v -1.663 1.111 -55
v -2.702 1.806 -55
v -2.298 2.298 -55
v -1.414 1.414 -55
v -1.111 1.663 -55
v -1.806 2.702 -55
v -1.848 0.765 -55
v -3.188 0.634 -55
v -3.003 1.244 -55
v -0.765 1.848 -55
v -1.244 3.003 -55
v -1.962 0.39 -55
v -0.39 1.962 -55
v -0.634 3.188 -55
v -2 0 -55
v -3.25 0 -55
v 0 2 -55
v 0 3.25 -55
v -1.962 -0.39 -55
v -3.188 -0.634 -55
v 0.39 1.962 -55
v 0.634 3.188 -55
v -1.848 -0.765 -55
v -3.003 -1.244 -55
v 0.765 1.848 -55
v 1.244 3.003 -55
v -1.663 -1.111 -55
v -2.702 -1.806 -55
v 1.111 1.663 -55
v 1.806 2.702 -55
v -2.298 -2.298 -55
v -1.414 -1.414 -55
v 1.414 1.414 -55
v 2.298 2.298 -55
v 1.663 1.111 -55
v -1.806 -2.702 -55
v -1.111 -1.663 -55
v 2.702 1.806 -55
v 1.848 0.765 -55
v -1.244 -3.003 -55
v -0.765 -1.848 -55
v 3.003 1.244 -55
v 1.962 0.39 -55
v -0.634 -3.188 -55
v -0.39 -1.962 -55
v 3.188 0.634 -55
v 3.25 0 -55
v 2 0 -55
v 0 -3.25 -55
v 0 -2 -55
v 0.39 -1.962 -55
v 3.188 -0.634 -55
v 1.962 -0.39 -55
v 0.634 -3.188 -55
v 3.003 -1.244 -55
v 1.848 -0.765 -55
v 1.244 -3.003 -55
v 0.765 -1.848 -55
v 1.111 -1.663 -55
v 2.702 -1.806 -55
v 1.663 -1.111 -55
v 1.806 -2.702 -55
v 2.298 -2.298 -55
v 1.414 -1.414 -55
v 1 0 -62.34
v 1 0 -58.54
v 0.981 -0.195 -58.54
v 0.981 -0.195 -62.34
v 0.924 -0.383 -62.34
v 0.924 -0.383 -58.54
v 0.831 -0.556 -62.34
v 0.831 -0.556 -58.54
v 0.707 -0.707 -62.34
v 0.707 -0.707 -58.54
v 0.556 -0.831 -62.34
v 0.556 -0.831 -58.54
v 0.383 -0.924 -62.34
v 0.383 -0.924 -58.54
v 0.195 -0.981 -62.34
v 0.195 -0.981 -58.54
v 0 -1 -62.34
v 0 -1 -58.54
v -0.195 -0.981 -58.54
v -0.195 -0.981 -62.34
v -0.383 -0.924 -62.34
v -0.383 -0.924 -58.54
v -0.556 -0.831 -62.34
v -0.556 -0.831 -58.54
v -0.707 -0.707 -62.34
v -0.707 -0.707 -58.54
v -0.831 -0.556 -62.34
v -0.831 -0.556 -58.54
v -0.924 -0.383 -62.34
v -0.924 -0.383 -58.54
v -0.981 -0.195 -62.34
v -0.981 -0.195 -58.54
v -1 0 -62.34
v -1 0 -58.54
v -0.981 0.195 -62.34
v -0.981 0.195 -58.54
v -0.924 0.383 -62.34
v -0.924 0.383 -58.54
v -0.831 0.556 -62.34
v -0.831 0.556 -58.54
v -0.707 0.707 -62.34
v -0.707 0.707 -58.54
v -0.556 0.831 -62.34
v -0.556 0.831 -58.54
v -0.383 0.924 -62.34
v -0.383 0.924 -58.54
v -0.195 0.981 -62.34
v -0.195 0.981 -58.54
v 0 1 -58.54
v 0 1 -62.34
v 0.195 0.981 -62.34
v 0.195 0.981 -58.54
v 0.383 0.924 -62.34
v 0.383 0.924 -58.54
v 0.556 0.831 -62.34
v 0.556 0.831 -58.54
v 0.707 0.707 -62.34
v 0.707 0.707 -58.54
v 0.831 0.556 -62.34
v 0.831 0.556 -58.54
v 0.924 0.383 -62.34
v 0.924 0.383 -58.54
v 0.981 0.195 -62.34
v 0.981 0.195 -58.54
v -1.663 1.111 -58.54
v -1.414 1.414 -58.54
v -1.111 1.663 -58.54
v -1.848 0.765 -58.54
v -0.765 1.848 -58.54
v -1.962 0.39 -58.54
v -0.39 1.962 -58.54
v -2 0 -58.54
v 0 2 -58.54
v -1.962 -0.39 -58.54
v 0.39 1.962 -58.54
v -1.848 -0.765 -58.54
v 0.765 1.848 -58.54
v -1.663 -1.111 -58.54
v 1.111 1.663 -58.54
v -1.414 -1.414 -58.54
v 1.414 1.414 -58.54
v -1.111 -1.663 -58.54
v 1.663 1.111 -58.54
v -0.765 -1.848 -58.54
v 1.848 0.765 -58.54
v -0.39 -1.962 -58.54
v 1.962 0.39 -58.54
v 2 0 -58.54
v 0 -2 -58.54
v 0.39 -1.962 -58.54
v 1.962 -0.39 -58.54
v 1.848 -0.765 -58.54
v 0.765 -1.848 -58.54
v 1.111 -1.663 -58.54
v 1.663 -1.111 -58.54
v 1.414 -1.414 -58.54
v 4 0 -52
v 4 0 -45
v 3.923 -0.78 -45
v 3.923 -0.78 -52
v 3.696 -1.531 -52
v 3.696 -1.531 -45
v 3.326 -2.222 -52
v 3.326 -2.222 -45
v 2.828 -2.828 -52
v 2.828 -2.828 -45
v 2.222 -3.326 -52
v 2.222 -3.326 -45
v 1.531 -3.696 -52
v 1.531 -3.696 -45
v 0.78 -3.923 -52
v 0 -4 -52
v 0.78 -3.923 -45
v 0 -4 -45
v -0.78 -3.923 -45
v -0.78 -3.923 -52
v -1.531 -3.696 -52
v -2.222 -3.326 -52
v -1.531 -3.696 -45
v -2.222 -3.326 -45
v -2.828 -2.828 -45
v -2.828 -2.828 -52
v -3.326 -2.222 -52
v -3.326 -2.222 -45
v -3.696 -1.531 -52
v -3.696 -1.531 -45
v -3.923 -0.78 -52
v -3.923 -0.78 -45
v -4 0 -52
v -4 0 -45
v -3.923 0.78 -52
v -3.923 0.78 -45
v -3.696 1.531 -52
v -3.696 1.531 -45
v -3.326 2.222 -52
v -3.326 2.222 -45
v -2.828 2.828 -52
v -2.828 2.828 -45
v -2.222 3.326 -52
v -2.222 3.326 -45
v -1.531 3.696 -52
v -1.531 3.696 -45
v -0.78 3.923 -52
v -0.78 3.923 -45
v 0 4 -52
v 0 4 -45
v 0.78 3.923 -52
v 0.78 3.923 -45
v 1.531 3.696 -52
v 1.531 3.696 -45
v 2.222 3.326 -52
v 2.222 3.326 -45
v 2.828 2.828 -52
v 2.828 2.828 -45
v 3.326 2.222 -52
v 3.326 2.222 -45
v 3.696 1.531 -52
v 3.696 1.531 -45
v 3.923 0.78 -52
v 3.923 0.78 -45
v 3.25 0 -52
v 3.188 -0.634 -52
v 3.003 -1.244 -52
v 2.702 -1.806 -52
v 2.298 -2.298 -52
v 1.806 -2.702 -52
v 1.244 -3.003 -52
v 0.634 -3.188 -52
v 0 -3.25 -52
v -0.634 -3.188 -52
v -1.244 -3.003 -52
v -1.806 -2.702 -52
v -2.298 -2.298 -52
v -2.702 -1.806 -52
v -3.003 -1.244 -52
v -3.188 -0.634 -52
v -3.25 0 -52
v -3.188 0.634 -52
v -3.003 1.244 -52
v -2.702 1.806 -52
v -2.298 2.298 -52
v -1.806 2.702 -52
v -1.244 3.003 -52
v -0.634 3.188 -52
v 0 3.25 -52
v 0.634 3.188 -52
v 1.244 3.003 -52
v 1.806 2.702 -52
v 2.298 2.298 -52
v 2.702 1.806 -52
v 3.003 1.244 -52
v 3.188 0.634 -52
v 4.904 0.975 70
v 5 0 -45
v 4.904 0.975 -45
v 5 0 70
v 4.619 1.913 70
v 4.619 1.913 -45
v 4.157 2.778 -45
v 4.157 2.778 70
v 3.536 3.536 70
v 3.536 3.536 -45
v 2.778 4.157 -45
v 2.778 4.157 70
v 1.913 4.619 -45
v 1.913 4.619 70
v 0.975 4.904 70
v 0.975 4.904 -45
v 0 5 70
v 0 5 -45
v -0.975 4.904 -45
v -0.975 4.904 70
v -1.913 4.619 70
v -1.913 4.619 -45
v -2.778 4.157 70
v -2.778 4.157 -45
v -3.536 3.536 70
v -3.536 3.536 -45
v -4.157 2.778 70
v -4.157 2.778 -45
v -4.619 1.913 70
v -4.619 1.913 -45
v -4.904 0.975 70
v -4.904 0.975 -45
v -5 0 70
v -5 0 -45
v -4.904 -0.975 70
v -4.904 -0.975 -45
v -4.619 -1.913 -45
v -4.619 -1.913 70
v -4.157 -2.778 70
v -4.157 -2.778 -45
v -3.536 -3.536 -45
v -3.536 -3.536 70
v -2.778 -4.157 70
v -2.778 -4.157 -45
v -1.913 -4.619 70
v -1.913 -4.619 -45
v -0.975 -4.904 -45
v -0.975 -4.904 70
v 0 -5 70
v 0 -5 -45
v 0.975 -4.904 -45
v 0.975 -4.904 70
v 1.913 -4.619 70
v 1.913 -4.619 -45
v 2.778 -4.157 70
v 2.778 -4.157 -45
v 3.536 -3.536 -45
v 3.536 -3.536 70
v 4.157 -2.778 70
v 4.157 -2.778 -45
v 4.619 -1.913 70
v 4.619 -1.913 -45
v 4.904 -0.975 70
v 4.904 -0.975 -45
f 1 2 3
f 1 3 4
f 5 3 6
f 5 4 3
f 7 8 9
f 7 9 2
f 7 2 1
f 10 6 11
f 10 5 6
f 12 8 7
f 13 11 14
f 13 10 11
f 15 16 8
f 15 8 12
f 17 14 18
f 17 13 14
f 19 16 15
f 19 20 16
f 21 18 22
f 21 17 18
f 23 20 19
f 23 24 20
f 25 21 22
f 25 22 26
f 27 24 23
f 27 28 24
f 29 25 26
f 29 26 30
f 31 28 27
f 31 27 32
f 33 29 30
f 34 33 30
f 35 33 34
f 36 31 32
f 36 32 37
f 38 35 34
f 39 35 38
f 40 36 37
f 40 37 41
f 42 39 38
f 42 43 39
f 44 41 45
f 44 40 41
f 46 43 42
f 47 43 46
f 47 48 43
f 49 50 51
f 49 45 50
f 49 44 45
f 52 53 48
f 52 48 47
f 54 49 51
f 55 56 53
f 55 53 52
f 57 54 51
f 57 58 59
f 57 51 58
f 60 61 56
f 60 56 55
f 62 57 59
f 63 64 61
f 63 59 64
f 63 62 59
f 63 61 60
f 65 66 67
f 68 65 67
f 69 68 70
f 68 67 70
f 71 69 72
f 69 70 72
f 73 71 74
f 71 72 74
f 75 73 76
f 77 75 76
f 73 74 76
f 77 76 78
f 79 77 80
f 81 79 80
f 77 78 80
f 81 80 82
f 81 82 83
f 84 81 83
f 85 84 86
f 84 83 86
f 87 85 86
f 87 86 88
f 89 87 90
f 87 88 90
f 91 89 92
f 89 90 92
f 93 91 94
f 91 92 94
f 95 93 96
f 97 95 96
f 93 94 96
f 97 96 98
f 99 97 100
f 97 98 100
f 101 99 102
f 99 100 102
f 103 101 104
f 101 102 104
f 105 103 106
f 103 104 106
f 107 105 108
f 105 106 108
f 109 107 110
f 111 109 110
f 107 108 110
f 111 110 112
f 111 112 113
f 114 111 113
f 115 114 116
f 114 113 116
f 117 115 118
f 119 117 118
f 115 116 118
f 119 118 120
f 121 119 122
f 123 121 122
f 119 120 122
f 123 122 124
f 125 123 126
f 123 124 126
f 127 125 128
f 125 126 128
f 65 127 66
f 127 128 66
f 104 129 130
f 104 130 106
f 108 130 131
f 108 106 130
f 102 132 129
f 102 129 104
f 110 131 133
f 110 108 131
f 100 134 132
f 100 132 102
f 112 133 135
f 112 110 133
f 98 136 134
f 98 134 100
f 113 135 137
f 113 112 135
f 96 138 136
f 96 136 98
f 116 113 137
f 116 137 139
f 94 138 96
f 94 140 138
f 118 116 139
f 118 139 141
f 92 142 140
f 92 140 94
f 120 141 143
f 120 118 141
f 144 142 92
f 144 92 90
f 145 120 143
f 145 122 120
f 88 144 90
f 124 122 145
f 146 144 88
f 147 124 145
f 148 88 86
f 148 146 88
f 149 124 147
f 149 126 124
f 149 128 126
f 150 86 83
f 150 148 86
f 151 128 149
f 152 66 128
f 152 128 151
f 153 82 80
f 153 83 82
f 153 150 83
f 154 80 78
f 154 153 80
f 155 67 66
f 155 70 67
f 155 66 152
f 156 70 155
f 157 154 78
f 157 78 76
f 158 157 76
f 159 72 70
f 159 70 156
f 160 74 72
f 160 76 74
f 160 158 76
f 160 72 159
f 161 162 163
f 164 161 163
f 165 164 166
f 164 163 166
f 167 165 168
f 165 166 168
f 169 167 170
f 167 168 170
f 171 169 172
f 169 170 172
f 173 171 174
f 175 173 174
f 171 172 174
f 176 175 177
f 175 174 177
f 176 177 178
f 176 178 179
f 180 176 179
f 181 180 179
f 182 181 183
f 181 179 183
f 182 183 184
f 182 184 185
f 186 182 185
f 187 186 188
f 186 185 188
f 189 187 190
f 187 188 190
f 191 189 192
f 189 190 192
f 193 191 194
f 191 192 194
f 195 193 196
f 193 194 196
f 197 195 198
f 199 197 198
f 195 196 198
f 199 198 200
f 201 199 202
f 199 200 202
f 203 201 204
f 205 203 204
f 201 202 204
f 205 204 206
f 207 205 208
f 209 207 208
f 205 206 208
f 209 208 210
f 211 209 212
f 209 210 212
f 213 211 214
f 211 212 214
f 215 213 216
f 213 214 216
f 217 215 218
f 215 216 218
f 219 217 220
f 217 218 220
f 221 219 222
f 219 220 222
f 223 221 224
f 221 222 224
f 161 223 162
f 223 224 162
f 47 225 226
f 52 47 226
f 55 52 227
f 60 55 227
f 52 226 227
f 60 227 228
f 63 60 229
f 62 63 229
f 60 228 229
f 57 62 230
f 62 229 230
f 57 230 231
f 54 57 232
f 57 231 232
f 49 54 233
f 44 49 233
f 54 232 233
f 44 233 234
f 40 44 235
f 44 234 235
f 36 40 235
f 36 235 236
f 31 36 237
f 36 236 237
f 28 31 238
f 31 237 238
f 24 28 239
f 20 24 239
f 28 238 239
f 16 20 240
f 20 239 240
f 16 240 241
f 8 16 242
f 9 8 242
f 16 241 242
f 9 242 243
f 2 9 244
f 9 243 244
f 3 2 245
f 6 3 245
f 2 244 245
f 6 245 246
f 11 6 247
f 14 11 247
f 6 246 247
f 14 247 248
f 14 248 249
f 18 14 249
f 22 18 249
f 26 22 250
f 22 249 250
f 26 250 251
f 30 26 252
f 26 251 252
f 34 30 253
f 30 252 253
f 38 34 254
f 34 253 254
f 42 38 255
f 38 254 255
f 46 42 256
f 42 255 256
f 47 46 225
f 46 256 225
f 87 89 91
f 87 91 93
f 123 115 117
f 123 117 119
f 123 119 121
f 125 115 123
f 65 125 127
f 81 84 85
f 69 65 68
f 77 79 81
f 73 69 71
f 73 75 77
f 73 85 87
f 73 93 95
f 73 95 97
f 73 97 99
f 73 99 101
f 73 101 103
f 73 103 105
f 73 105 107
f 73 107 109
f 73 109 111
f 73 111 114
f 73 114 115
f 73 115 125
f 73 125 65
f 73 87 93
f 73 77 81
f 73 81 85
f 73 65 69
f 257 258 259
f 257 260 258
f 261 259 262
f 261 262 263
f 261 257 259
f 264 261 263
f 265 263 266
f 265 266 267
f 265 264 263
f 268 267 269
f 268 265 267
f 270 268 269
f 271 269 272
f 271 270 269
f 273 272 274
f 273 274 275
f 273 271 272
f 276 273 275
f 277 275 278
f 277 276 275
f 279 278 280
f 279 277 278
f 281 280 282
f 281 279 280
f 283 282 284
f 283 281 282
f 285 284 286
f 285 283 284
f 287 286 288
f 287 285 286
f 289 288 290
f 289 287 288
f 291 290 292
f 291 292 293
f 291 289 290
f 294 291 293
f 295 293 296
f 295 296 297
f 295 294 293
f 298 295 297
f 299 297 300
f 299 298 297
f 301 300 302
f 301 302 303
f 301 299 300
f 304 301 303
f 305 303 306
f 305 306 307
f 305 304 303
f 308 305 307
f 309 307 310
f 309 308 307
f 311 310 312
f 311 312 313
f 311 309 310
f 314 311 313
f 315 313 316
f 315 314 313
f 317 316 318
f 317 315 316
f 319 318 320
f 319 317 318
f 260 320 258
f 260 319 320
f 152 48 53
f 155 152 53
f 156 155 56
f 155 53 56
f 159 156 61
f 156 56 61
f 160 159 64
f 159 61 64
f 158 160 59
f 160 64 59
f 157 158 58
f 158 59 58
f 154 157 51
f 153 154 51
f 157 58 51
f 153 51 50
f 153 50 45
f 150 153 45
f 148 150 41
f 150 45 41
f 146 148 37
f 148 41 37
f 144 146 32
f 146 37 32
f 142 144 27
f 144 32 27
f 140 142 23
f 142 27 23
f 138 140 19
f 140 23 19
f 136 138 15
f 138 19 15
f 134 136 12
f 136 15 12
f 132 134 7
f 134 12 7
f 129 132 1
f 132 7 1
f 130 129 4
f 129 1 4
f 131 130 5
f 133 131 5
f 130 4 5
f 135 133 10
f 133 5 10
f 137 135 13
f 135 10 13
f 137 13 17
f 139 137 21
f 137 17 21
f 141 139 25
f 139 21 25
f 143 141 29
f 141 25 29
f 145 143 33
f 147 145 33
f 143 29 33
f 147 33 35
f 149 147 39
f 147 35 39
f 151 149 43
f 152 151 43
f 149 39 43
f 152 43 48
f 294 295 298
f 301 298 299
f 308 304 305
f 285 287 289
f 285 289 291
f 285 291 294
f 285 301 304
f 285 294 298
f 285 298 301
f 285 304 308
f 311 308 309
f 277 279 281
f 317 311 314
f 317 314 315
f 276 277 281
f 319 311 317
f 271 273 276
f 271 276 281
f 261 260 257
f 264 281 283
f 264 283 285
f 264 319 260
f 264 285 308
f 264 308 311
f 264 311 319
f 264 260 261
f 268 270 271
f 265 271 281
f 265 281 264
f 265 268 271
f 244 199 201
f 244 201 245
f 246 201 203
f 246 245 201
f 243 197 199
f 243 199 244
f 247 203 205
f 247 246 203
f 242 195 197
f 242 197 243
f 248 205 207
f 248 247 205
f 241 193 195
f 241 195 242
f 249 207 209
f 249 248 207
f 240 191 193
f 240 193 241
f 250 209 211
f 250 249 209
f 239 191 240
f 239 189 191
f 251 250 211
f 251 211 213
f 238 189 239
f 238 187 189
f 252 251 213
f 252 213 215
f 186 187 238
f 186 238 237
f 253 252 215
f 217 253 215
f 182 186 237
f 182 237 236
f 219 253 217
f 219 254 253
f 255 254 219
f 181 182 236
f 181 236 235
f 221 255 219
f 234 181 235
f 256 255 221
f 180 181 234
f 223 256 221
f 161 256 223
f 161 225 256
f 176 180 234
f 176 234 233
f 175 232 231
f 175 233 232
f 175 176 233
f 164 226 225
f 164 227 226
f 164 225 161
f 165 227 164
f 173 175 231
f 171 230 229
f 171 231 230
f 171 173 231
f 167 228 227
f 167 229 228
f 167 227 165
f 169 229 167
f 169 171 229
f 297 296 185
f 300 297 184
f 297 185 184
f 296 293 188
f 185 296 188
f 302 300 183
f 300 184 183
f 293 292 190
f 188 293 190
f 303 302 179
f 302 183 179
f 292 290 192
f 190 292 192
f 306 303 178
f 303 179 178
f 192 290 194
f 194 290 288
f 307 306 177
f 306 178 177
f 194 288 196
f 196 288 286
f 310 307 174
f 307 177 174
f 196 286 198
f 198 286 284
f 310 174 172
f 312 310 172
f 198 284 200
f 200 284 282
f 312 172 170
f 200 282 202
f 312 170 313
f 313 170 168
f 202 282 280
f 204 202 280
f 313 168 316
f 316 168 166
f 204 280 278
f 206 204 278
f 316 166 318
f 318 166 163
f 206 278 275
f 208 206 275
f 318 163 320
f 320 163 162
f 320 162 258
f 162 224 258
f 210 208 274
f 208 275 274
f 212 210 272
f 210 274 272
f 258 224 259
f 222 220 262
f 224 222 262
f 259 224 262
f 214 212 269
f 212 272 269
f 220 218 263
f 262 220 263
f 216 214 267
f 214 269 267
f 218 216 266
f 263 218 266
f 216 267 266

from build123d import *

# Parameters (mm, degrees)
F0_R          = 5
F1_DEPTH      = 70
F1_DEPTH_BACK = 45
F2_R          = 4
F3_DEPTH      = 7
F4_R          = 3.25
F5_DEPTH      = 3
F6_R          = 2
F7_DEPTH      = 3.54
F8_R          = 1
F9_DEPTH      = 3.8


with BuildPart() as f1:
    # F0 (on Top) → F1 (new body, two sides)
    with BuildSketch(Plane.XY) as f1_sk:
        Circle(F0_R)
    extrude(amount=F1_DEPTH)
    extrude(f1_sk.sketch, amount=-F1_DEPTH_BACK)

    # F2 (on face) → F3 (join)
    with BuildSketch(Plane(origin=(0, 0, -45), x_dir=(1, 0, 0), z_dir=(0, 0, -1))):
        Circle(F2_R)
    extrude(amount=F3_DEPTH)

    # F4 (on face) → F5 (join)
    with BuildSketch(Plane(origin=(0, 0, -52), x_dir=(1, 0, 0), z_dir=(0, 0, -1))):
        Circle(F4_R)
    extrude(amount=F5_DEPTH)

    # F6 (on face) → F7 (join)
    with BuildSketch(Plane(origin=(0, 0, -55), x_dir=(1, 0, 0), z_dir=(0, 0, -1))):
        Circle(F6_R)
    extrude(amount=F7_DEPTH)

    # F8 (on face) → F9 (join)
    with BuildSketch(Plane(origin=(0, 0, -58.54), x_dir=(1, 0, 0), z_dir=(0, 0, -1))):
        Circle(F8_R)
    extrude(amount=F9_DEPTH)


solid = f1.part
